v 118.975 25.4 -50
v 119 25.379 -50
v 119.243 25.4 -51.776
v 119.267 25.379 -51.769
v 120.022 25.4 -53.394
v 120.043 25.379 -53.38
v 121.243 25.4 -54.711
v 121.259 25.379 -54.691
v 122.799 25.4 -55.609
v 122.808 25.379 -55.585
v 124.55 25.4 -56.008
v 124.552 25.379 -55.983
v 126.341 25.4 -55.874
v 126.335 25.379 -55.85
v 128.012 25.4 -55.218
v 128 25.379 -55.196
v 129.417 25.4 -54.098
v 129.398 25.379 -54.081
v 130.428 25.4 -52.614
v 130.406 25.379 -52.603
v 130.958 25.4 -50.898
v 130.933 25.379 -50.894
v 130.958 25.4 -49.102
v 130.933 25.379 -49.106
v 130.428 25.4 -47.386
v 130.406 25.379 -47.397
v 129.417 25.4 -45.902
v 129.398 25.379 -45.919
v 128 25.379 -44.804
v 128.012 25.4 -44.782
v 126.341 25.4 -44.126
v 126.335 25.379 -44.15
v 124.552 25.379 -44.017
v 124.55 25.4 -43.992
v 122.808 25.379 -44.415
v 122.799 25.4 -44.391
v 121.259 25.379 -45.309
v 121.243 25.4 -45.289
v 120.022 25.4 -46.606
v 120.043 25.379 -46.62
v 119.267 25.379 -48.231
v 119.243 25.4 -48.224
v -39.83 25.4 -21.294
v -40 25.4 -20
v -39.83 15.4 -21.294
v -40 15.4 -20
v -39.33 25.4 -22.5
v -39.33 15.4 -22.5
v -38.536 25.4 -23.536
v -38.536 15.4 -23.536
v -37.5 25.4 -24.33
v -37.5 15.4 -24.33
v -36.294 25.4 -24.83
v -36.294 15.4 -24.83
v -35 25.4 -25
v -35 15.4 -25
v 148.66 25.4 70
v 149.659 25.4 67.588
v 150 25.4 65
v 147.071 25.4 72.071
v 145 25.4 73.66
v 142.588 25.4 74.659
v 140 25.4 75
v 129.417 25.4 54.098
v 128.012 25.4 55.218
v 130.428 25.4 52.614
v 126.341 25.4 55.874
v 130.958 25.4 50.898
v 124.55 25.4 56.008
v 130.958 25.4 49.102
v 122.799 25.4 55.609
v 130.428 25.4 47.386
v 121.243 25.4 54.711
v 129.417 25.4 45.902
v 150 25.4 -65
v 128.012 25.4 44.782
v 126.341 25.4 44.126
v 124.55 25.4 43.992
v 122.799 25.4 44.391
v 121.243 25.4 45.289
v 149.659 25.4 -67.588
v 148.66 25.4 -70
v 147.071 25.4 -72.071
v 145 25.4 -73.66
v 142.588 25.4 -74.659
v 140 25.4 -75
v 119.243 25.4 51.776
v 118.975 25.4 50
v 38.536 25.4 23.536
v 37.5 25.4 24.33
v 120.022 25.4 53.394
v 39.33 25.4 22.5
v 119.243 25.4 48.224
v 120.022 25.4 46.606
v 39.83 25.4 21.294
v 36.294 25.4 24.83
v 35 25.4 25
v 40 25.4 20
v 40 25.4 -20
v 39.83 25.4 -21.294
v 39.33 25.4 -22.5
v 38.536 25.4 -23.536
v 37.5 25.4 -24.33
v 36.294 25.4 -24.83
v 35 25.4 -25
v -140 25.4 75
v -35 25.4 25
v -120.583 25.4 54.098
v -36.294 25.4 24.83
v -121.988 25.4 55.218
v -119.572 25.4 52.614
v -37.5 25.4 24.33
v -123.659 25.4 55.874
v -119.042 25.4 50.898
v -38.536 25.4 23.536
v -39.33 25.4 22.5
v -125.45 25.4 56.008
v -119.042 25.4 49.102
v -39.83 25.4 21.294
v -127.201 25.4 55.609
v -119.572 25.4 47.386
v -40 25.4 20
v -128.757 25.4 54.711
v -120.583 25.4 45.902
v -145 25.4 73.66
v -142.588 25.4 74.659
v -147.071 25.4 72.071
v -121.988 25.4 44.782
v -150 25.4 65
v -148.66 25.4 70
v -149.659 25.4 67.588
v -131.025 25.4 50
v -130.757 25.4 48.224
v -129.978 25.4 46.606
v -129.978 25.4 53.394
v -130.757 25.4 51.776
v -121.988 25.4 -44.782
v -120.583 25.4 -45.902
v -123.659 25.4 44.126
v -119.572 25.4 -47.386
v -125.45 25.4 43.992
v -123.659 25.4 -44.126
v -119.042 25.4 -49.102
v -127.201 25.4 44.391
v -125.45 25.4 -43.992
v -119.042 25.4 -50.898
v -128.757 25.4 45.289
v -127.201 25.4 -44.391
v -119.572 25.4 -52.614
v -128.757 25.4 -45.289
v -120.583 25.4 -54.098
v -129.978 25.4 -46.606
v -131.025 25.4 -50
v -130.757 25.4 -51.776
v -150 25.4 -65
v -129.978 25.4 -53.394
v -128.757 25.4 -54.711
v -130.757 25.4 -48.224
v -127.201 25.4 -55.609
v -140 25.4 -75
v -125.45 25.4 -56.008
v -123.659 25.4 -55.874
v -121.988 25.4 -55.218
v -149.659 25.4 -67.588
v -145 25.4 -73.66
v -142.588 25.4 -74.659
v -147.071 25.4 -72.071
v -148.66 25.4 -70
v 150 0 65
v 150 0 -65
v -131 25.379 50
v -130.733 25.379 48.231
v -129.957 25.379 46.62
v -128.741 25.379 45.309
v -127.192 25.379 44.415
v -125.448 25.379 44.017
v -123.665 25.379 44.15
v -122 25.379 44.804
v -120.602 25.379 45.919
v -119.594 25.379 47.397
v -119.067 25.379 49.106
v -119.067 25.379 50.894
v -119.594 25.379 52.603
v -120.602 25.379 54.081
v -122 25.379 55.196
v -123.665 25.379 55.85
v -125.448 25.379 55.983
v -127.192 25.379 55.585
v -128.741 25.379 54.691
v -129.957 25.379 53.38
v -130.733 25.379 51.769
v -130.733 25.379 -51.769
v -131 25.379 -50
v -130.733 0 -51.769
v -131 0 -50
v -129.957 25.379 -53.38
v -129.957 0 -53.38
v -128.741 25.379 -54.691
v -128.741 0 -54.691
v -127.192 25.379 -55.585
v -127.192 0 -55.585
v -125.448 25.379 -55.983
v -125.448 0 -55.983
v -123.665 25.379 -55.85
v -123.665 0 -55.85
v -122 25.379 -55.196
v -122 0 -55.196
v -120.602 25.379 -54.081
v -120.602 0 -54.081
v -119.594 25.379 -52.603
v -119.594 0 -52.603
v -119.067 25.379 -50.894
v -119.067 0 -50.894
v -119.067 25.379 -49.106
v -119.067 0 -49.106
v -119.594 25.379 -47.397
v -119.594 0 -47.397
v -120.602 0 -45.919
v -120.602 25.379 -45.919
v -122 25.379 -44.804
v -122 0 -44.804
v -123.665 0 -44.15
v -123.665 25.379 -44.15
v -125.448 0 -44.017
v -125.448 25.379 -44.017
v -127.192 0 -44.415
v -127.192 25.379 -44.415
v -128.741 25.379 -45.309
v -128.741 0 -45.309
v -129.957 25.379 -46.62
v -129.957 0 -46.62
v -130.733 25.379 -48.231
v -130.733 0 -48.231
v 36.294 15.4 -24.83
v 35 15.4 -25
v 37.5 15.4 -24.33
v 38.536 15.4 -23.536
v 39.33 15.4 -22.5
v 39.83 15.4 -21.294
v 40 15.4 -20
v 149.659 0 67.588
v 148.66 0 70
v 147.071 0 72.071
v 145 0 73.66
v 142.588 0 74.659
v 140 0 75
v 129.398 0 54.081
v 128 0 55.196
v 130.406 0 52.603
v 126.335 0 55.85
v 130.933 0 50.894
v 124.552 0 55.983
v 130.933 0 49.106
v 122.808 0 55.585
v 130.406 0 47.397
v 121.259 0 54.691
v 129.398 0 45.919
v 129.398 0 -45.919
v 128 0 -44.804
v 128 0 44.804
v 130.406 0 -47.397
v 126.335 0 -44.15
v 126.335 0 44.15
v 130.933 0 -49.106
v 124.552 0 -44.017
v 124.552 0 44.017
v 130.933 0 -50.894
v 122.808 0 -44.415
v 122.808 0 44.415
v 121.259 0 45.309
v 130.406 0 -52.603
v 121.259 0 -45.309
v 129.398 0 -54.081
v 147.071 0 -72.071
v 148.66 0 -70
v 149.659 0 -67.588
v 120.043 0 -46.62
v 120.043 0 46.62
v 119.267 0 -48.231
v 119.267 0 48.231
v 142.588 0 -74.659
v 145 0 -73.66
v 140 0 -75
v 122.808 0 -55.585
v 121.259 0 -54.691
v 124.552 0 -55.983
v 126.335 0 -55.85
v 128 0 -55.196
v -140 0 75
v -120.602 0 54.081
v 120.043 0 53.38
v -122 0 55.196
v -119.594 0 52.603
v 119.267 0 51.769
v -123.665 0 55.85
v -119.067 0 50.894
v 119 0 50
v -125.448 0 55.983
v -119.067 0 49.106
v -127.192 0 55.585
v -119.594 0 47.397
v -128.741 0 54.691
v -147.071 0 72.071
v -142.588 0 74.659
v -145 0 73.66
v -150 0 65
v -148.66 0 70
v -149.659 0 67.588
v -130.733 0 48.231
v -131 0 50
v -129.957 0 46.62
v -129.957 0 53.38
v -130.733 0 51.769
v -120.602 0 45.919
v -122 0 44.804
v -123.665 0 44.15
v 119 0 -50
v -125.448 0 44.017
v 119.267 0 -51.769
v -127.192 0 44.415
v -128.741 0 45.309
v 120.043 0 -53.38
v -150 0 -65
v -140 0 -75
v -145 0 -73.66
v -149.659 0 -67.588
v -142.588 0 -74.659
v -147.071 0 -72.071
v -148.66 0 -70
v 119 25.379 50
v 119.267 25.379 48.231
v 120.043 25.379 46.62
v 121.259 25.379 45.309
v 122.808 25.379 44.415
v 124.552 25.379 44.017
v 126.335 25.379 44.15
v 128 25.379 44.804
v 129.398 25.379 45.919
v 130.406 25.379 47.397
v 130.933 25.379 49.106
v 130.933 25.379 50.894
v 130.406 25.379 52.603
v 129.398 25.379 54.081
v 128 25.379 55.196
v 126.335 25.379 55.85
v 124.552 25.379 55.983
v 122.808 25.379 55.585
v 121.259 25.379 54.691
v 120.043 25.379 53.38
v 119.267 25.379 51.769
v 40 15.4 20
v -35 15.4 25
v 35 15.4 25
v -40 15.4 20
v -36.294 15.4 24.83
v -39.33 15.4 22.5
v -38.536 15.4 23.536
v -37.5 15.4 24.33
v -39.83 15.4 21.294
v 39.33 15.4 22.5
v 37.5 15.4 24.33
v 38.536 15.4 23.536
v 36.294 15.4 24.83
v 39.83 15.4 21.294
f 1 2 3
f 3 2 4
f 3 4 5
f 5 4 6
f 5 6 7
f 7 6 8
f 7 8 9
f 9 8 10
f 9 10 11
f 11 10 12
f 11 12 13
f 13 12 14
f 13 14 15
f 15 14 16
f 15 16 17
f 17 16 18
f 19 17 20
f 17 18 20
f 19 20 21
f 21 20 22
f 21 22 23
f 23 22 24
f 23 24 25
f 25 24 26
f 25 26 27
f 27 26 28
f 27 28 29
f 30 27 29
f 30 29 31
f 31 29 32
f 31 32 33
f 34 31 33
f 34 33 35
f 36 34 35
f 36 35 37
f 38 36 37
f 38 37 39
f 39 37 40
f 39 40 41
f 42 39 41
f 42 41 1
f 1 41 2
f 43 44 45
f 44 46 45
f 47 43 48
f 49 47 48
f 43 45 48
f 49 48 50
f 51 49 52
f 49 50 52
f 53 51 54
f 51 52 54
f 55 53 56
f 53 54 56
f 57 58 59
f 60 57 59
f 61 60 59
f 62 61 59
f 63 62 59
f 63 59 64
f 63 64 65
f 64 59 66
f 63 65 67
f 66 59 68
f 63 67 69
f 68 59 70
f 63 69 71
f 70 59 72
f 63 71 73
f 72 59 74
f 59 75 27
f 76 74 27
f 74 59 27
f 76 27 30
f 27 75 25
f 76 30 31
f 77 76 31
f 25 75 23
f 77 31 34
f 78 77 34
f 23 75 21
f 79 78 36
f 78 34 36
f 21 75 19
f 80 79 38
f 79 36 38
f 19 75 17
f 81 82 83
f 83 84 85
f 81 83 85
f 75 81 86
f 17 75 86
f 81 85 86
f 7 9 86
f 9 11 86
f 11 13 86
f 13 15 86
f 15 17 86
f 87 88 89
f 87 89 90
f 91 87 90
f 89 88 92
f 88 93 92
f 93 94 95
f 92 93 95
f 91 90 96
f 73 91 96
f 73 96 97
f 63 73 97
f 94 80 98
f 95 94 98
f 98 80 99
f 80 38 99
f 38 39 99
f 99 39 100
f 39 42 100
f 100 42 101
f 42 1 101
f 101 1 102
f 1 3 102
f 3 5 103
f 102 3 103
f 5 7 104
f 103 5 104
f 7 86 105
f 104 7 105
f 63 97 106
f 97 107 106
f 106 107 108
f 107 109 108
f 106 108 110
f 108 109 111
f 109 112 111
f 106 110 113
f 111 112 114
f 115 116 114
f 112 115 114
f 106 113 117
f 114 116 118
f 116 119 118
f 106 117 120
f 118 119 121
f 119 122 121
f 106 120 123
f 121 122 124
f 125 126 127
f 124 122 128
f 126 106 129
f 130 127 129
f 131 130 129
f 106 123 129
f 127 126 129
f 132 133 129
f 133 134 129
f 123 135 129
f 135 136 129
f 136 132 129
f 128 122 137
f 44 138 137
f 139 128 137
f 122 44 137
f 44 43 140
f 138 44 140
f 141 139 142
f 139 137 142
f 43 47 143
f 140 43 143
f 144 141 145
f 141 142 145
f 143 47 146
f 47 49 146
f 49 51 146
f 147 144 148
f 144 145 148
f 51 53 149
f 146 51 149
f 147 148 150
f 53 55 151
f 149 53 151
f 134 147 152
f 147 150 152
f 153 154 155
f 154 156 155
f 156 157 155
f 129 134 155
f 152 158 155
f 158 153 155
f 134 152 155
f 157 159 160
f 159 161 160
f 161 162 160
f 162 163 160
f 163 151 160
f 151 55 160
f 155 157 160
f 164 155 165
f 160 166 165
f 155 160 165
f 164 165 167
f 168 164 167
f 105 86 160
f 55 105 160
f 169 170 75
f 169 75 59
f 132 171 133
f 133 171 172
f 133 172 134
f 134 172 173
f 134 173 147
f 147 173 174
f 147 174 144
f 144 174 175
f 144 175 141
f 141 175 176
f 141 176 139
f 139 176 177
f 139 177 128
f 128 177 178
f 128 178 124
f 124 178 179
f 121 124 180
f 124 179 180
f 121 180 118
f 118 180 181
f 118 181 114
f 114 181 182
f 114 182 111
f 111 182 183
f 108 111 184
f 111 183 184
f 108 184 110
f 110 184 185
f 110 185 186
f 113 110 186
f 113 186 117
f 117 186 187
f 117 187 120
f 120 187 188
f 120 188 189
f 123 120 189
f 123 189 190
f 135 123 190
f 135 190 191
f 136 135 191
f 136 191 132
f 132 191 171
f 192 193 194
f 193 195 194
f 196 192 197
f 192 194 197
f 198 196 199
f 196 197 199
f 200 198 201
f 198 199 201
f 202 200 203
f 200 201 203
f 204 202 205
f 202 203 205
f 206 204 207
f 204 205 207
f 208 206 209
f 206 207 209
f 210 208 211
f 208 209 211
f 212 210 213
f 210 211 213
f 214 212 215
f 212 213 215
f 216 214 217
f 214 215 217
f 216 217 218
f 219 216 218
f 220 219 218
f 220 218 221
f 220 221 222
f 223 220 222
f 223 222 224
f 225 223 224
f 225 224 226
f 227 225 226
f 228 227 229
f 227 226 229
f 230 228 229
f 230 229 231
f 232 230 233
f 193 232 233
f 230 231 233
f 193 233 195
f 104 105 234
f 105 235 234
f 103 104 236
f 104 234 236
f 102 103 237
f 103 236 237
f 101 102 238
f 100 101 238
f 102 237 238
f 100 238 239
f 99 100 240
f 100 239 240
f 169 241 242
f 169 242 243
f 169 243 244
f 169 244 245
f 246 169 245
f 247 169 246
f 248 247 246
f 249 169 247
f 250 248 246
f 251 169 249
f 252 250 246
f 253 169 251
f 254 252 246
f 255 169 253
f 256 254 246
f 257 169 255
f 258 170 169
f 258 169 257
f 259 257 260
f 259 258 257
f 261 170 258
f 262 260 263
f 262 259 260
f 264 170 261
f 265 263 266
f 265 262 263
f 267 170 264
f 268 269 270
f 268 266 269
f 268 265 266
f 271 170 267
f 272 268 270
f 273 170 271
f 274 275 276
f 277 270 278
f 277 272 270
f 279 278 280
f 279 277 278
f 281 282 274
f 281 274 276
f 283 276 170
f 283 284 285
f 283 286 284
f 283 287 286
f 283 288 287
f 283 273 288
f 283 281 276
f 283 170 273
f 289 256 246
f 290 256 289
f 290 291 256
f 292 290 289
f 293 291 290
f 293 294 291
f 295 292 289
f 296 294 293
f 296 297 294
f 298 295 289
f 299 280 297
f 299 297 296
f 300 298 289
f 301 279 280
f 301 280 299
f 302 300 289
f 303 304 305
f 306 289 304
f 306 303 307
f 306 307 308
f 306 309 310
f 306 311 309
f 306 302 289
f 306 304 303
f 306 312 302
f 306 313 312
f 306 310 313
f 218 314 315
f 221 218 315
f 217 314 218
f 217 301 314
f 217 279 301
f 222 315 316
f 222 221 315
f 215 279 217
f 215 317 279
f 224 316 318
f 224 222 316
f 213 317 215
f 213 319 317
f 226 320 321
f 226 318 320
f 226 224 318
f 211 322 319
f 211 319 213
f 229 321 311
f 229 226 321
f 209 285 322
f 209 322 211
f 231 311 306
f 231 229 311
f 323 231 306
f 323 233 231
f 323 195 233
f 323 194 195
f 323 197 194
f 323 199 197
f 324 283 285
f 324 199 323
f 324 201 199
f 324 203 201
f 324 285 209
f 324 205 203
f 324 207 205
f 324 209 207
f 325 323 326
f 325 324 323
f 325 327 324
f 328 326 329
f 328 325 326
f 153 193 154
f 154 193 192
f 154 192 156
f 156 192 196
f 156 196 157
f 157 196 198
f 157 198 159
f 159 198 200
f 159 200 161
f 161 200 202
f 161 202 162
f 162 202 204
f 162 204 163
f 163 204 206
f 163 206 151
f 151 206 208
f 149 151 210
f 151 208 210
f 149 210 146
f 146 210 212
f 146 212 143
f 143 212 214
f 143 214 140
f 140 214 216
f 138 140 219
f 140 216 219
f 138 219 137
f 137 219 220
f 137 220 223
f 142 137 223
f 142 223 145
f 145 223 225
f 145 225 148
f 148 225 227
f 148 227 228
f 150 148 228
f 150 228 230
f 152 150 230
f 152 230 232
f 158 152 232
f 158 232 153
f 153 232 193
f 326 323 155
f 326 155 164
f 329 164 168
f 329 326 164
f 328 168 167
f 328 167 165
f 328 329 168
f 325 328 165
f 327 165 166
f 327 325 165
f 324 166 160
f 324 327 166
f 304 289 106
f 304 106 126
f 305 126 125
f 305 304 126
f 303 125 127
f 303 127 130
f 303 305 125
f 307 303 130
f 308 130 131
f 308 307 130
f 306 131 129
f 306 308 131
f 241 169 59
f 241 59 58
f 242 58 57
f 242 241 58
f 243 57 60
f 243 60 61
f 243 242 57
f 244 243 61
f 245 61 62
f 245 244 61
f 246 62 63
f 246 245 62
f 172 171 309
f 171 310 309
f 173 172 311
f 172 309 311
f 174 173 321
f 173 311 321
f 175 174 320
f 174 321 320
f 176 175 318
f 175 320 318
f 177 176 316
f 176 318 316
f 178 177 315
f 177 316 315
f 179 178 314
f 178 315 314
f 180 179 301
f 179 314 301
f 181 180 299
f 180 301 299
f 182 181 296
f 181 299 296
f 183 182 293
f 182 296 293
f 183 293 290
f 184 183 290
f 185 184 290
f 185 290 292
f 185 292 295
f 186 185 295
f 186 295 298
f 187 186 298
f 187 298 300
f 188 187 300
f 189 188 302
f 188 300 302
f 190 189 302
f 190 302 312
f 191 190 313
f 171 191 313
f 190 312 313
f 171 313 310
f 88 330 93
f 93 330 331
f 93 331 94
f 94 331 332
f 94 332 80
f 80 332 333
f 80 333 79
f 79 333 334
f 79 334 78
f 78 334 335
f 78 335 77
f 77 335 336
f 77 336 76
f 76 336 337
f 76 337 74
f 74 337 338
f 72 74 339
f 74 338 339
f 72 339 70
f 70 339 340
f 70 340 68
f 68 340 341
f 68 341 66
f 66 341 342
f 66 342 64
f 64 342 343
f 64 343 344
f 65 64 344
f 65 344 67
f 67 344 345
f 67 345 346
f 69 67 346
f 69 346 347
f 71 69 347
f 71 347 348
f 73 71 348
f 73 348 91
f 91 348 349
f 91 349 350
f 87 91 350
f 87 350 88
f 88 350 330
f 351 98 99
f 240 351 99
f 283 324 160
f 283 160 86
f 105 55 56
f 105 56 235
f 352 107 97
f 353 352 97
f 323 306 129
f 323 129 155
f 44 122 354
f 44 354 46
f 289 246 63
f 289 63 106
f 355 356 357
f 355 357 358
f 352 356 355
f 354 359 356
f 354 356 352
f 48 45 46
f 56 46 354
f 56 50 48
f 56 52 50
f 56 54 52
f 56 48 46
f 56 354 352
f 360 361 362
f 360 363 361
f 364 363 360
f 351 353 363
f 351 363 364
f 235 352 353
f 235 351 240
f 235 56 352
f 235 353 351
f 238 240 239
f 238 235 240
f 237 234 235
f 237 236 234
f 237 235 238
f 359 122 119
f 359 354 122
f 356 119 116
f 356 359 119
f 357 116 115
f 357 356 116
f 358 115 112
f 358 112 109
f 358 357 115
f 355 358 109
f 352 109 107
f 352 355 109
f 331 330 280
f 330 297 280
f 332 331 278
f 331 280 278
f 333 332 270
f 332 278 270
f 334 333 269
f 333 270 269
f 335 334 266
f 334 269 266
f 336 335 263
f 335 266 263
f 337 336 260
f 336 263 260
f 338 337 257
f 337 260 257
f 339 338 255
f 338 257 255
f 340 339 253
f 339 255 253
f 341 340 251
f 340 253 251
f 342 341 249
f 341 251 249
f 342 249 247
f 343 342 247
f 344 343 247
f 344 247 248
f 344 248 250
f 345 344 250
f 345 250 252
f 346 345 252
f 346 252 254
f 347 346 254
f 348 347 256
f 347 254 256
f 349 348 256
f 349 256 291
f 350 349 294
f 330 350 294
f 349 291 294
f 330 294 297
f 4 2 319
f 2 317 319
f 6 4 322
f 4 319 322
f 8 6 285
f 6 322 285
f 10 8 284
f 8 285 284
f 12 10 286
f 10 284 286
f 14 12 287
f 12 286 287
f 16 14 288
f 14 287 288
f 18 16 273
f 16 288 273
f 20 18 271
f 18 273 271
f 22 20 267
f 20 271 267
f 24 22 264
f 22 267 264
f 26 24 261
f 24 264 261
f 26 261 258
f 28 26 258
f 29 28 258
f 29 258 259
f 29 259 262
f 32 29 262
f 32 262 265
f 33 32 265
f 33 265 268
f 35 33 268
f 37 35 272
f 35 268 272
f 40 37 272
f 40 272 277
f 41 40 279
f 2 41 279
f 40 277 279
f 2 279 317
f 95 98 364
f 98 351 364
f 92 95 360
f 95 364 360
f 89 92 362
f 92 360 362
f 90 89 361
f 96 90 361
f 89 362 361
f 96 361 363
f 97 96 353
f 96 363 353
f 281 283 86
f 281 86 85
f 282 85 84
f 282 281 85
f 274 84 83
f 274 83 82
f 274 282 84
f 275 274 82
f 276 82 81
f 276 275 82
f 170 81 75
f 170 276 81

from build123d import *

# Parameters (mm, degrees)
BOSS_EXTRUDE1_DEPTH                  = 25.4
SKETCH4_W                            = 80
SKETCH4_H                            = 50
CUT_EXTRUDE1_DEPTH                   = 10
FILLET1_R                            = 5
F_12_0_12_DIAMETER_HOLE1_D           = 12
F_12_0_12_DIAMETER_HOLE1_CSINK_D     = 12.05
F_12_0_12_DIAMETER_HOLE1_CSINK_ANGLE = 100


with BuildPart() as part:
    # Sketch1 → Boss-Extrude1 (new body)
    with BuildSketch(Plane(origin=(0, 0, 0), x_dir=(1, 0, 0), z_dir=(0, 1, 0))):
        with BuildLine():
            Line((-140, 75), (140, 75))
            ThreePointArc((140, 75), (147.071067812, 72.071067812), (150, 65))
            Line((150, 65), (150, -65))
            ThreePointArc((150, -65), (147.071067812, -72.071067812), (140, -75))
            Line((140, -75), (-140, -75))
            ThreePointArc((-140, -75), (-147.071067812, -72.071067812), (-150, -65))
            Line((-150, -65), (-150, 65))
            ThreePointArc((-150, 65), (-147.071067812, 72.071067812), (-140, 75))
        make_face()
    extrude(amount=BOSS_EXTRUDE1_DEPTH)

    # Sketch4 → Cut-Extrude1 (cut)
    with BuildSketch(Plane(origin=(0, 25.4, 0), x_dir=(1, 0, 0), z_dir=(0, 1, 0))):
        Rectangle(SKETCH4_W, SKETCH4_H)
    extrude(amount=-CUT_EXTRUDE1_DEPTH, mode=Mode.SUBTRACT)

    # Fillet1
    fillet1_edges = [part.edges().sort_by_distance(p)[0] for p in [
        (40, 20.4, -25),
        (40, 20.4, 25),
        (-40, 20.4, 25),
        (-40, 20.4, -25),
    ]]
    fillet(fillet1_edges, radius=FILLET1_R)

    # Ø12.0 (12) Diameter Hole1 (through all)
    with Locations(Plane(origin=(0, 25.4, 0), x_dir=(1, 0, 0), z_dir=(0, 1, 0))):
        with Locations((-125, 50), (125, 50), (125, -50), (-125, -50)):
            CounterSinkHole(F_12_0_12_DIAMETER_HOLE1_D / 2, F_12_0_12_DIAMETER_HOLE1_CSINK_D / 2, counter_sink_angle=F_12_0_12_DIAMETER_HOLE1_CSINK_ANGLE)


solid = part.part
